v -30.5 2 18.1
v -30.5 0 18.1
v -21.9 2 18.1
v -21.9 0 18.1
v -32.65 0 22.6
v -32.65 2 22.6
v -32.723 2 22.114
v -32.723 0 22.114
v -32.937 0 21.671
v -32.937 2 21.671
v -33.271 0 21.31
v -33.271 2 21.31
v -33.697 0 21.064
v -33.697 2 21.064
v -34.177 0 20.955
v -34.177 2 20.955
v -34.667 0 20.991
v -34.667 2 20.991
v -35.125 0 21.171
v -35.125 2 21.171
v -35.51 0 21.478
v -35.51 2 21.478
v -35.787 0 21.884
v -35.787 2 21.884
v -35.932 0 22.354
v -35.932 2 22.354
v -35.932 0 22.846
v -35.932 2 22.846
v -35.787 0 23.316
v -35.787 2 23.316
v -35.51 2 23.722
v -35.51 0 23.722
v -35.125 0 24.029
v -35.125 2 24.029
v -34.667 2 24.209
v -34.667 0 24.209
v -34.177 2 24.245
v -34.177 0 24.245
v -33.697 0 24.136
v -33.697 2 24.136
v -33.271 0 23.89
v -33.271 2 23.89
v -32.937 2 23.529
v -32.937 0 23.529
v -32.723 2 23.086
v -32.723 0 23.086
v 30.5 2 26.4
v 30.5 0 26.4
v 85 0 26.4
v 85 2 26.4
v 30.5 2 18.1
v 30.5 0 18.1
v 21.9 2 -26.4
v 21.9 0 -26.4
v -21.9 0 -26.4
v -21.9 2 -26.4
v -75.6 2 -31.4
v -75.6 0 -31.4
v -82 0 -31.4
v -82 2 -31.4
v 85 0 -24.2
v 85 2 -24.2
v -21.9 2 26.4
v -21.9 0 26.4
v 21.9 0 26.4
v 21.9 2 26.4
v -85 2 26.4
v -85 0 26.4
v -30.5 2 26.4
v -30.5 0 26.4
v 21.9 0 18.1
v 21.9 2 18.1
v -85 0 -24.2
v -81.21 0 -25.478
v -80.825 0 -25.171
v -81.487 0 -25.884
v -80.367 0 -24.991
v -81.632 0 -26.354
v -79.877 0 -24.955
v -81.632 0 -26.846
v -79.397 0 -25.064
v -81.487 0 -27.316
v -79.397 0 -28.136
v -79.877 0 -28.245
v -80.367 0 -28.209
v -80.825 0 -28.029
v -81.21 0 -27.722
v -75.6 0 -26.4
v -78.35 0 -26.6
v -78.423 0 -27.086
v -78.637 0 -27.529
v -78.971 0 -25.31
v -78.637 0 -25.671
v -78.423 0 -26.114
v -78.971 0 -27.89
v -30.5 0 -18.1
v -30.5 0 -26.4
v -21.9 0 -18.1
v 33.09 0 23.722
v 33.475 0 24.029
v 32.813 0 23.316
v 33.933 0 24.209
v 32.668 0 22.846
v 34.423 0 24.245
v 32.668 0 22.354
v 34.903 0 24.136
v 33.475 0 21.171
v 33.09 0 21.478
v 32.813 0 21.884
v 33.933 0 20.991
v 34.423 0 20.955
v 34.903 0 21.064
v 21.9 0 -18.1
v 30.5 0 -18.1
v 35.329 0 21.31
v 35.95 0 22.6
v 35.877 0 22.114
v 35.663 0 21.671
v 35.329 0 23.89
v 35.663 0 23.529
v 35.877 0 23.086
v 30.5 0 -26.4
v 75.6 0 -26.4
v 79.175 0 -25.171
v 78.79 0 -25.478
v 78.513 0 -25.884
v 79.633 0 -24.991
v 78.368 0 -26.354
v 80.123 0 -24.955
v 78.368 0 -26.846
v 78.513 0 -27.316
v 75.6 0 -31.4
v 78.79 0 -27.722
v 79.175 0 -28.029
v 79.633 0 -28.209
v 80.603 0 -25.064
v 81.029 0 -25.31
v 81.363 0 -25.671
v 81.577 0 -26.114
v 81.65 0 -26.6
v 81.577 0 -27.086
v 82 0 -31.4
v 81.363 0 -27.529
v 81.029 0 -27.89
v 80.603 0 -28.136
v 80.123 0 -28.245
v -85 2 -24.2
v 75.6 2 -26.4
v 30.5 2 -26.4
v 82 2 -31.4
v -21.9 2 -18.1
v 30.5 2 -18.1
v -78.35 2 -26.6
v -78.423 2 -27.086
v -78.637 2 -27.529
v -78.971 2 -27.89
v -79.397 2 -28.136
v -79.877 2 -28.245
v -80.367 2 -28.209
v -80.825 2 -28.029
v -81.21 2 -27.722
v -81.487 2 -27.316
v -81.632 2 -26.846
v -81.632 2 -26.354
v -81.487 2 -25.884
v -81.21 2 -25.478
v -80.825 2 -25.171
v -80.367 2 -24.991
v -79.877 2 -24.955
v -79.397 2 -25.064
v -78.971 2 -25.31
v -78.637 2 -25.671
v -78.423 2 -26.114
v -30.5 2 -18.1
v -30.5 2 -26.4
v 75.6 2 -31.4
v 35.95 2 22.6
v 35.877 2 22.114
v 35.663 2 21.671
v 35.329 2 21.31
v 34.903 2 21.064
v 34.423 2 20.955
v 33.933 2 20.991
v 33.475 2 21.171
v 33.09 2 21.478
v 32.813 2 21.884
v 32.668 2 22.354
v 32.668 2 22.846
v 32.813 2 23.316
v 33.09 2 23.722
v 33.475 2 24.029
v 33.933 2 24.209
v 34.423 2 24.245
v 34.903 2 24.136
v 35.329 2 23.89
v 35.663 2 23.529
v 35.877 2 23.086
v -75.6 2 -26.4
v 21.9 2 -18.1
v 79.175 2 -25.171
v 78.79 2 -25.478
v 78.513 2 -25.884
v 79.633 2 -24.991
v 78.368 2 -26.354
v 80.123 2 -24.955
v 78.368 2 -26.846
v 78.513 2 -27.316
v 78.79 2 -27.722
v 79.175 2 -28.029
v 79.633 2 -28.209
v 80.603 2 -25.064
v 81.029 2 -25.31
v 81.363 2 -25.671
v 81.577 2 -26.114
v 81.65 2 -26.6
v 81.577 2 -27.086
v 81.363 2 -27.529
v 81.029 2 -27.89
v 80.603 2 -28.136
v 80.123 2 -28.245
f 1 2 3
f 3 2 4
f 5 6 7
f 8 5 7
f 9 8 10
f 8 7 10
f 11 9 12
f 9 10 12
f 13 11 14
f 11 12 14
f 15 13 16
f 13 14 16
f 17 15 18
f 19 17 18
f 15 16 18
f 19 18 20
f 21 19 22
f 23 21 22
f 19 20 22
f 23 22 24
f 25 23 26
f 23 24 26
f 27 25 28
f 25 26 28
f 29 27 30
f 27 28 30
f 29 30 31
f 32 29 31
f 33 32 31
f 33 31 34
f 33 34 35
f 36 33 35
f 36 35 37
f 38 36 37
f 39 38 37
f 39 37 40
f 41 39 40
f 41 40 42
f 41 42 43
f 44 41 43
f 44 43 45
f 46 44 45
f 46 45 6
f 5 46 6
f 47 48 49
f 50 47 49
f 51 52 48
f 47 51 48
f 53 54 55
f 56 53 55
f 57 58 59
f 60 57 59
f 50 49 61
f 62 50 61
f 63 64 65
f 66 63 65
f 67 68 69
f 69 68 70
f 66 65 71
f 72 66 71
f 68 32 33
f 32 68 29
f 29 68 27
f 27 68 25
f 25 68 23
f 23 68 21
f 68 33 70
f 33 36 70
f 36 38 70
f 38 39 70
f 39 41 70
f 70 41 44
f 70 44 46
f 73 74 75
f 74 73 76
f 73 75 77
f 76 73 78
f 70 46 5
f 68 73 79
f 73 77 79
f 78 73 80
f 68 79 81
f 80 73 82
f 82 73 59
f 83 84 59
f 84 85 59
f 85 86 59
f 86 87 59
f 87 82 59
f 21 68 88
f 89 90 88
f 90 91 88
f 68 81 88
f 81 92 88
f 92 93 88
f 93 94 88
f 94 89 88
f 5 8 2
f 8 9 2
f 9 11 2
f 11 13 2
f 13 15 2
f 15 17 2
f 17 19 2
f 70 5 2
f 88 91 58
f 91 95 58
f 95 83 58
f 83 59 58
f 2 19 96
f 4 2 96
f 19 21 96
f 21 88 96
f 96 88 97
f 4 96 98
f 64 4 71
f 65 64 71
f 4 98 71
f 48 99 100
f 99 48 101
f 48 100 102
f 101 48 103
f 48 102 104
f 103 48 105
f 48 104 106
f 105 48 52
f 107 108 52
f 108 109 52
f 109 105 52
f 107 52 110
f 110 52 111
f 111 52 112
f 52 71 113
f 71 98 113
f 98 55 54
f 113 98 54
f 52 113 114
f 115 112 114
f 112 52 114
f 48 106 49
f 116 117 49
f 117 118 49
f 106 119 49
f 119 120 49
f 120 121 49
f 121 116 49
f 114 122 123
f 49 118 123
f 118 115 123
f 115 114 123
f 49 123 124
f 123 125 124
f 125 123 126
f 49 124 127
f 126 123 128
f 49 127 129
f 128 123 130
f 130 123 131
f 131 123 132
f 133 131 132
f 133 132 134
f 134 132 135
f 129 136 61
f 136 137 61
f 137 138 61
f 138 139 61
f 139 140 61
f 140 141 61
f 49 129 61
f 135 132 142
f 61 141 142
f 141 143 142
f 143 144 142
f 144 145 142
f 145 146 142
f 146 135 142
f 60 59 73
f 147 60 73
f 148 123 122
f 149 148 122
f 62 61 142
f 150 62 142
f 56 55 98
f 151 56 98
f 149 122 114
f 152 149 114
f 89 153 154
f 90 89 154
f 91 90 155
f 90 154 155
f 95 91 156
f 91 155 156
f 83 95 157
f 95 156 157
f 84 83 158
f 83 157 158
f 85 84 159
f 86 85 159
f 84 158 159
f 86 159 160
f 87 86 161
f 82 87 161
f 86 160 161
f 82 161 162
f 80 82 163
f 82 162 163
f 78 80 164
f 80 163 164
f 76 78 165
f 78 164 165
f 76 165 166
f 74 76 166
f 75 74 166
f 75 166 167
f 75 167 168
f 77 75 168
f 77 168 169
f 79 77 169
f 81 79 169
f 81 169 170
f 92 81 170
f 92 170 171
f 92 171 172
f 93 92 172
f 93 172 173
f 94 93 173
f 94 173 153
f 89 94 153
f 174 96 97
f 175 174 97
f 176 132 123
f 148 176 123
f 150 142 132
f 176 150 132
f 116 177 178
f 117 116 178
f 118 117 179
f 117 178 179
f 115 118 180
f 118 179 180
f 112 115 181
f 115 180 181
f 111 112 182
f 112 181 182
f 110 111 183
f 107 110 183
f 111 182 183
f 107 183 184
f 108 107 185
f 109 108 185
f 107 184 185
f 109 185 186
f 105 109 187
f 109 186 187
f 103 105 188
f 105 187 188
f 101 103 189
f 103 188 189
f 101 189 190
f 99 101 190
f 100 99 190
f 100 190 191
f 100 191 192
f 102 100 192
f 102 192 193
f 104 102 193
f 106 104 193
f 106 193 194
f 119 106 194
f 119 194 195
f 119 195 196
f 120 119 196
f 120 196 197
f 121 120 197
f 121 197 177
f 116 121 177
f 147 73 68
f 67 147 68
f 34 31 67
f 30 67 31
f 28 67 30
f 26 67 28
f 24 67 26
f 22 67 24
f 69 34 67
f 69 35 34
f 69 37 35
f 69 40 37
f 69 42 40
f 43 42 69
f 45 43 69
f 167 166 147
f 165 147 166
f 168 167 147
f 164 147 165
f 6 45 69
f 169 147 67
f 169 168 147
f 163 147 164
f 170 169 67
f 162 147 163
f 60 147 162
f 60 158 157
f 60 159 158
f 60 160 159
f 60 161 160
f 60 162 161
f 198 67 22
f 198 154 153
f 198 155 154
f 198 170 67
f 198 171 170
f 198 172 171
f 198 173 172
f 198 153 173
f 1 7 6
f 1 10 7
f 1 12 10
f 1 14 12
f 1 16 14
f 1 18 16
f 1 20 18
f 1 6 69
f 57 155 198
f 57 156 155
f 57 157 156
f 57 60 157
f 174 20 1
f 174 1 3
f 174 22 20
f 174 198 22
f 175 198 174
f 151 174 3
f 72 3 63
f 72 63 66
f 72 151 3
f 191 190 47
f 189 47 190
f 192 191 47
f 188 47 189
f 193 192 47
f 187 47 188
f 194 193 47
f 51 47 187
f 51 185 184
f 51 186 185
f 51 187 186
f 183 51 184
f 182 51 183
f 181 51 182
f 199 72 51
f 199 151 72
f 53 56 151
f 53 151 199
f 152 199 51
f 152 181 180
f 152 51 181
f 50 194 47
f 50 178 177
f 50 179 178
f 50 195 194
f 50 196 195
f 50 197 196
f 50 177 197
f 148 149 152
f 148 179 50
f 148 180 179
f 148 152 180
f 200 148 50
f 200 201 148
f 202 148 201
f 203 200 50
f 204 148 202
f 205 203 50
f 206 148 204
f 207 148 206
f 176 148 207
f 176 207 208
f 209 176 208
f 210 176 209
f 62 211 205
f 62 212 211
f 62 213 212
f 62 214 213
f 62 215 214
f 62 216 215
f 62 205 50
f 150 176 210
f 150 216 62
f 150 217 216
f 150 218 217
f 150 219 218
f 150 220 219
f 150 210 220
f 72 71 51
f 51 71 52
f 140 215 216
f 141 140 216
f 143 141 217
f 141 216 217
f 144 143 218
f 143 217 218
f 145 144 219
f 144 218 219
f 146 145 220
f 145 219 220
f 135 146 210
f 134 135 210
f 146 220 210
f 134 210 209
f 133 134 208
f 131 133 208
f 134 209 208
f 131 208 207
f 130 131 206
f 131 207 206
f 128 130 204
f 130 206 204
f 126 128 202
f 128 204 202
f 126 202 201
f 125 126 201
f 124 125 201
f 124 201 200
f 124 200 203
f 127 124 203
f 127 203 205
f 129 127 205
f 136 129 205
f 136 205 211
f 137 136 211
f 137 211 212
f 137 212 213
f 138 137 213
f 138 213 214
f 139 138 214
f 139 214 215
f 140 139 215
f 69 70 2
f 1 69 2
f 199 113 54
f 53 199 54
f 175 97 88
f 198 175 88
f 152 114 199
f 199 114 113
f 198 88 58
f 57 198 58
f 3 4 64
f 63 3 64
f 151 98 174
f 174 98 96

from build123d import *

# Parameters (mm, degrees)
BOSS_EXTRU_1_DEPTH           = 2
ESQUISSE2_R                  = 1.65
ENL_V_MAT_EXTRU_1_DEPTH      = 1
ENL_V_MAT_EXTRU_1_DEPTH_BACK = 3


with BuildPart() as part:
    # Esquisse1 → Boss.-Extru.1 (new body)
    with BuildSketch(Plane(origin=(0, 0, 0), x_dir=(1, 0, 0), z_dir=(0, 1, 0))):
        Polygon((21.9, 26.4), (-21.9, 26.4), (-21.9, 18.1), (-30.5, 18.1), (-30.5, 26.4), (-75.6, 26.4), (-75.6, 31.4), (-82, 31.4), (-85, 24.2), (-85, -26.4), (-30.5, -26.4), (-30.5, -18.1), (-21.9, -18.1), (-21.9, -26.4), (21.9, -26.4), (21.9, -18.1), (30.5, -18.1), (30.5, -26.4), (85, -26.4), (85, 24.2), (82, 31.4), (75.6, 31.4), (75.6, 26.4), (30.5, 26.4), (30.5, 18.1), (21.9, 18.1), align=None)
    extrude(amount=BOSS_EXTRU_1_DEPTH)

    # Esquisse2 → Enlèv. mat.-Extru.1 (cut, two sides)
    with BuildSketch(Plane(origin=(0, 2, 0), x_dir=(1, 0, 0), z_dir=(0, 1, 0))) as enl_v_mat_extru_1_sk:
        with Locations((-80, 26.6)):
            Circle(ESQUISSE2_R)
        with Locations((-34.3, -22.6)):
            Circle(ESQUISSE2_R)
        with Locations((34.3, -22.6)):
            Circle(ESQUISSE2_R)
        with Locations((80, 26.6)):
            Circle(ESQUISSE2_R)
    extrude(amount=ENL_V_MAT_EXTRU_1_DEPTH, mode=Mode.SUBTRACT)
    extrude(enl_v_mat_extru_1_sk.sketch, amount=-ENL_V_MAT_EXTRU_1_DEPTH_BACK, mode=Mode.SUBTRACT)


solid = part.part
